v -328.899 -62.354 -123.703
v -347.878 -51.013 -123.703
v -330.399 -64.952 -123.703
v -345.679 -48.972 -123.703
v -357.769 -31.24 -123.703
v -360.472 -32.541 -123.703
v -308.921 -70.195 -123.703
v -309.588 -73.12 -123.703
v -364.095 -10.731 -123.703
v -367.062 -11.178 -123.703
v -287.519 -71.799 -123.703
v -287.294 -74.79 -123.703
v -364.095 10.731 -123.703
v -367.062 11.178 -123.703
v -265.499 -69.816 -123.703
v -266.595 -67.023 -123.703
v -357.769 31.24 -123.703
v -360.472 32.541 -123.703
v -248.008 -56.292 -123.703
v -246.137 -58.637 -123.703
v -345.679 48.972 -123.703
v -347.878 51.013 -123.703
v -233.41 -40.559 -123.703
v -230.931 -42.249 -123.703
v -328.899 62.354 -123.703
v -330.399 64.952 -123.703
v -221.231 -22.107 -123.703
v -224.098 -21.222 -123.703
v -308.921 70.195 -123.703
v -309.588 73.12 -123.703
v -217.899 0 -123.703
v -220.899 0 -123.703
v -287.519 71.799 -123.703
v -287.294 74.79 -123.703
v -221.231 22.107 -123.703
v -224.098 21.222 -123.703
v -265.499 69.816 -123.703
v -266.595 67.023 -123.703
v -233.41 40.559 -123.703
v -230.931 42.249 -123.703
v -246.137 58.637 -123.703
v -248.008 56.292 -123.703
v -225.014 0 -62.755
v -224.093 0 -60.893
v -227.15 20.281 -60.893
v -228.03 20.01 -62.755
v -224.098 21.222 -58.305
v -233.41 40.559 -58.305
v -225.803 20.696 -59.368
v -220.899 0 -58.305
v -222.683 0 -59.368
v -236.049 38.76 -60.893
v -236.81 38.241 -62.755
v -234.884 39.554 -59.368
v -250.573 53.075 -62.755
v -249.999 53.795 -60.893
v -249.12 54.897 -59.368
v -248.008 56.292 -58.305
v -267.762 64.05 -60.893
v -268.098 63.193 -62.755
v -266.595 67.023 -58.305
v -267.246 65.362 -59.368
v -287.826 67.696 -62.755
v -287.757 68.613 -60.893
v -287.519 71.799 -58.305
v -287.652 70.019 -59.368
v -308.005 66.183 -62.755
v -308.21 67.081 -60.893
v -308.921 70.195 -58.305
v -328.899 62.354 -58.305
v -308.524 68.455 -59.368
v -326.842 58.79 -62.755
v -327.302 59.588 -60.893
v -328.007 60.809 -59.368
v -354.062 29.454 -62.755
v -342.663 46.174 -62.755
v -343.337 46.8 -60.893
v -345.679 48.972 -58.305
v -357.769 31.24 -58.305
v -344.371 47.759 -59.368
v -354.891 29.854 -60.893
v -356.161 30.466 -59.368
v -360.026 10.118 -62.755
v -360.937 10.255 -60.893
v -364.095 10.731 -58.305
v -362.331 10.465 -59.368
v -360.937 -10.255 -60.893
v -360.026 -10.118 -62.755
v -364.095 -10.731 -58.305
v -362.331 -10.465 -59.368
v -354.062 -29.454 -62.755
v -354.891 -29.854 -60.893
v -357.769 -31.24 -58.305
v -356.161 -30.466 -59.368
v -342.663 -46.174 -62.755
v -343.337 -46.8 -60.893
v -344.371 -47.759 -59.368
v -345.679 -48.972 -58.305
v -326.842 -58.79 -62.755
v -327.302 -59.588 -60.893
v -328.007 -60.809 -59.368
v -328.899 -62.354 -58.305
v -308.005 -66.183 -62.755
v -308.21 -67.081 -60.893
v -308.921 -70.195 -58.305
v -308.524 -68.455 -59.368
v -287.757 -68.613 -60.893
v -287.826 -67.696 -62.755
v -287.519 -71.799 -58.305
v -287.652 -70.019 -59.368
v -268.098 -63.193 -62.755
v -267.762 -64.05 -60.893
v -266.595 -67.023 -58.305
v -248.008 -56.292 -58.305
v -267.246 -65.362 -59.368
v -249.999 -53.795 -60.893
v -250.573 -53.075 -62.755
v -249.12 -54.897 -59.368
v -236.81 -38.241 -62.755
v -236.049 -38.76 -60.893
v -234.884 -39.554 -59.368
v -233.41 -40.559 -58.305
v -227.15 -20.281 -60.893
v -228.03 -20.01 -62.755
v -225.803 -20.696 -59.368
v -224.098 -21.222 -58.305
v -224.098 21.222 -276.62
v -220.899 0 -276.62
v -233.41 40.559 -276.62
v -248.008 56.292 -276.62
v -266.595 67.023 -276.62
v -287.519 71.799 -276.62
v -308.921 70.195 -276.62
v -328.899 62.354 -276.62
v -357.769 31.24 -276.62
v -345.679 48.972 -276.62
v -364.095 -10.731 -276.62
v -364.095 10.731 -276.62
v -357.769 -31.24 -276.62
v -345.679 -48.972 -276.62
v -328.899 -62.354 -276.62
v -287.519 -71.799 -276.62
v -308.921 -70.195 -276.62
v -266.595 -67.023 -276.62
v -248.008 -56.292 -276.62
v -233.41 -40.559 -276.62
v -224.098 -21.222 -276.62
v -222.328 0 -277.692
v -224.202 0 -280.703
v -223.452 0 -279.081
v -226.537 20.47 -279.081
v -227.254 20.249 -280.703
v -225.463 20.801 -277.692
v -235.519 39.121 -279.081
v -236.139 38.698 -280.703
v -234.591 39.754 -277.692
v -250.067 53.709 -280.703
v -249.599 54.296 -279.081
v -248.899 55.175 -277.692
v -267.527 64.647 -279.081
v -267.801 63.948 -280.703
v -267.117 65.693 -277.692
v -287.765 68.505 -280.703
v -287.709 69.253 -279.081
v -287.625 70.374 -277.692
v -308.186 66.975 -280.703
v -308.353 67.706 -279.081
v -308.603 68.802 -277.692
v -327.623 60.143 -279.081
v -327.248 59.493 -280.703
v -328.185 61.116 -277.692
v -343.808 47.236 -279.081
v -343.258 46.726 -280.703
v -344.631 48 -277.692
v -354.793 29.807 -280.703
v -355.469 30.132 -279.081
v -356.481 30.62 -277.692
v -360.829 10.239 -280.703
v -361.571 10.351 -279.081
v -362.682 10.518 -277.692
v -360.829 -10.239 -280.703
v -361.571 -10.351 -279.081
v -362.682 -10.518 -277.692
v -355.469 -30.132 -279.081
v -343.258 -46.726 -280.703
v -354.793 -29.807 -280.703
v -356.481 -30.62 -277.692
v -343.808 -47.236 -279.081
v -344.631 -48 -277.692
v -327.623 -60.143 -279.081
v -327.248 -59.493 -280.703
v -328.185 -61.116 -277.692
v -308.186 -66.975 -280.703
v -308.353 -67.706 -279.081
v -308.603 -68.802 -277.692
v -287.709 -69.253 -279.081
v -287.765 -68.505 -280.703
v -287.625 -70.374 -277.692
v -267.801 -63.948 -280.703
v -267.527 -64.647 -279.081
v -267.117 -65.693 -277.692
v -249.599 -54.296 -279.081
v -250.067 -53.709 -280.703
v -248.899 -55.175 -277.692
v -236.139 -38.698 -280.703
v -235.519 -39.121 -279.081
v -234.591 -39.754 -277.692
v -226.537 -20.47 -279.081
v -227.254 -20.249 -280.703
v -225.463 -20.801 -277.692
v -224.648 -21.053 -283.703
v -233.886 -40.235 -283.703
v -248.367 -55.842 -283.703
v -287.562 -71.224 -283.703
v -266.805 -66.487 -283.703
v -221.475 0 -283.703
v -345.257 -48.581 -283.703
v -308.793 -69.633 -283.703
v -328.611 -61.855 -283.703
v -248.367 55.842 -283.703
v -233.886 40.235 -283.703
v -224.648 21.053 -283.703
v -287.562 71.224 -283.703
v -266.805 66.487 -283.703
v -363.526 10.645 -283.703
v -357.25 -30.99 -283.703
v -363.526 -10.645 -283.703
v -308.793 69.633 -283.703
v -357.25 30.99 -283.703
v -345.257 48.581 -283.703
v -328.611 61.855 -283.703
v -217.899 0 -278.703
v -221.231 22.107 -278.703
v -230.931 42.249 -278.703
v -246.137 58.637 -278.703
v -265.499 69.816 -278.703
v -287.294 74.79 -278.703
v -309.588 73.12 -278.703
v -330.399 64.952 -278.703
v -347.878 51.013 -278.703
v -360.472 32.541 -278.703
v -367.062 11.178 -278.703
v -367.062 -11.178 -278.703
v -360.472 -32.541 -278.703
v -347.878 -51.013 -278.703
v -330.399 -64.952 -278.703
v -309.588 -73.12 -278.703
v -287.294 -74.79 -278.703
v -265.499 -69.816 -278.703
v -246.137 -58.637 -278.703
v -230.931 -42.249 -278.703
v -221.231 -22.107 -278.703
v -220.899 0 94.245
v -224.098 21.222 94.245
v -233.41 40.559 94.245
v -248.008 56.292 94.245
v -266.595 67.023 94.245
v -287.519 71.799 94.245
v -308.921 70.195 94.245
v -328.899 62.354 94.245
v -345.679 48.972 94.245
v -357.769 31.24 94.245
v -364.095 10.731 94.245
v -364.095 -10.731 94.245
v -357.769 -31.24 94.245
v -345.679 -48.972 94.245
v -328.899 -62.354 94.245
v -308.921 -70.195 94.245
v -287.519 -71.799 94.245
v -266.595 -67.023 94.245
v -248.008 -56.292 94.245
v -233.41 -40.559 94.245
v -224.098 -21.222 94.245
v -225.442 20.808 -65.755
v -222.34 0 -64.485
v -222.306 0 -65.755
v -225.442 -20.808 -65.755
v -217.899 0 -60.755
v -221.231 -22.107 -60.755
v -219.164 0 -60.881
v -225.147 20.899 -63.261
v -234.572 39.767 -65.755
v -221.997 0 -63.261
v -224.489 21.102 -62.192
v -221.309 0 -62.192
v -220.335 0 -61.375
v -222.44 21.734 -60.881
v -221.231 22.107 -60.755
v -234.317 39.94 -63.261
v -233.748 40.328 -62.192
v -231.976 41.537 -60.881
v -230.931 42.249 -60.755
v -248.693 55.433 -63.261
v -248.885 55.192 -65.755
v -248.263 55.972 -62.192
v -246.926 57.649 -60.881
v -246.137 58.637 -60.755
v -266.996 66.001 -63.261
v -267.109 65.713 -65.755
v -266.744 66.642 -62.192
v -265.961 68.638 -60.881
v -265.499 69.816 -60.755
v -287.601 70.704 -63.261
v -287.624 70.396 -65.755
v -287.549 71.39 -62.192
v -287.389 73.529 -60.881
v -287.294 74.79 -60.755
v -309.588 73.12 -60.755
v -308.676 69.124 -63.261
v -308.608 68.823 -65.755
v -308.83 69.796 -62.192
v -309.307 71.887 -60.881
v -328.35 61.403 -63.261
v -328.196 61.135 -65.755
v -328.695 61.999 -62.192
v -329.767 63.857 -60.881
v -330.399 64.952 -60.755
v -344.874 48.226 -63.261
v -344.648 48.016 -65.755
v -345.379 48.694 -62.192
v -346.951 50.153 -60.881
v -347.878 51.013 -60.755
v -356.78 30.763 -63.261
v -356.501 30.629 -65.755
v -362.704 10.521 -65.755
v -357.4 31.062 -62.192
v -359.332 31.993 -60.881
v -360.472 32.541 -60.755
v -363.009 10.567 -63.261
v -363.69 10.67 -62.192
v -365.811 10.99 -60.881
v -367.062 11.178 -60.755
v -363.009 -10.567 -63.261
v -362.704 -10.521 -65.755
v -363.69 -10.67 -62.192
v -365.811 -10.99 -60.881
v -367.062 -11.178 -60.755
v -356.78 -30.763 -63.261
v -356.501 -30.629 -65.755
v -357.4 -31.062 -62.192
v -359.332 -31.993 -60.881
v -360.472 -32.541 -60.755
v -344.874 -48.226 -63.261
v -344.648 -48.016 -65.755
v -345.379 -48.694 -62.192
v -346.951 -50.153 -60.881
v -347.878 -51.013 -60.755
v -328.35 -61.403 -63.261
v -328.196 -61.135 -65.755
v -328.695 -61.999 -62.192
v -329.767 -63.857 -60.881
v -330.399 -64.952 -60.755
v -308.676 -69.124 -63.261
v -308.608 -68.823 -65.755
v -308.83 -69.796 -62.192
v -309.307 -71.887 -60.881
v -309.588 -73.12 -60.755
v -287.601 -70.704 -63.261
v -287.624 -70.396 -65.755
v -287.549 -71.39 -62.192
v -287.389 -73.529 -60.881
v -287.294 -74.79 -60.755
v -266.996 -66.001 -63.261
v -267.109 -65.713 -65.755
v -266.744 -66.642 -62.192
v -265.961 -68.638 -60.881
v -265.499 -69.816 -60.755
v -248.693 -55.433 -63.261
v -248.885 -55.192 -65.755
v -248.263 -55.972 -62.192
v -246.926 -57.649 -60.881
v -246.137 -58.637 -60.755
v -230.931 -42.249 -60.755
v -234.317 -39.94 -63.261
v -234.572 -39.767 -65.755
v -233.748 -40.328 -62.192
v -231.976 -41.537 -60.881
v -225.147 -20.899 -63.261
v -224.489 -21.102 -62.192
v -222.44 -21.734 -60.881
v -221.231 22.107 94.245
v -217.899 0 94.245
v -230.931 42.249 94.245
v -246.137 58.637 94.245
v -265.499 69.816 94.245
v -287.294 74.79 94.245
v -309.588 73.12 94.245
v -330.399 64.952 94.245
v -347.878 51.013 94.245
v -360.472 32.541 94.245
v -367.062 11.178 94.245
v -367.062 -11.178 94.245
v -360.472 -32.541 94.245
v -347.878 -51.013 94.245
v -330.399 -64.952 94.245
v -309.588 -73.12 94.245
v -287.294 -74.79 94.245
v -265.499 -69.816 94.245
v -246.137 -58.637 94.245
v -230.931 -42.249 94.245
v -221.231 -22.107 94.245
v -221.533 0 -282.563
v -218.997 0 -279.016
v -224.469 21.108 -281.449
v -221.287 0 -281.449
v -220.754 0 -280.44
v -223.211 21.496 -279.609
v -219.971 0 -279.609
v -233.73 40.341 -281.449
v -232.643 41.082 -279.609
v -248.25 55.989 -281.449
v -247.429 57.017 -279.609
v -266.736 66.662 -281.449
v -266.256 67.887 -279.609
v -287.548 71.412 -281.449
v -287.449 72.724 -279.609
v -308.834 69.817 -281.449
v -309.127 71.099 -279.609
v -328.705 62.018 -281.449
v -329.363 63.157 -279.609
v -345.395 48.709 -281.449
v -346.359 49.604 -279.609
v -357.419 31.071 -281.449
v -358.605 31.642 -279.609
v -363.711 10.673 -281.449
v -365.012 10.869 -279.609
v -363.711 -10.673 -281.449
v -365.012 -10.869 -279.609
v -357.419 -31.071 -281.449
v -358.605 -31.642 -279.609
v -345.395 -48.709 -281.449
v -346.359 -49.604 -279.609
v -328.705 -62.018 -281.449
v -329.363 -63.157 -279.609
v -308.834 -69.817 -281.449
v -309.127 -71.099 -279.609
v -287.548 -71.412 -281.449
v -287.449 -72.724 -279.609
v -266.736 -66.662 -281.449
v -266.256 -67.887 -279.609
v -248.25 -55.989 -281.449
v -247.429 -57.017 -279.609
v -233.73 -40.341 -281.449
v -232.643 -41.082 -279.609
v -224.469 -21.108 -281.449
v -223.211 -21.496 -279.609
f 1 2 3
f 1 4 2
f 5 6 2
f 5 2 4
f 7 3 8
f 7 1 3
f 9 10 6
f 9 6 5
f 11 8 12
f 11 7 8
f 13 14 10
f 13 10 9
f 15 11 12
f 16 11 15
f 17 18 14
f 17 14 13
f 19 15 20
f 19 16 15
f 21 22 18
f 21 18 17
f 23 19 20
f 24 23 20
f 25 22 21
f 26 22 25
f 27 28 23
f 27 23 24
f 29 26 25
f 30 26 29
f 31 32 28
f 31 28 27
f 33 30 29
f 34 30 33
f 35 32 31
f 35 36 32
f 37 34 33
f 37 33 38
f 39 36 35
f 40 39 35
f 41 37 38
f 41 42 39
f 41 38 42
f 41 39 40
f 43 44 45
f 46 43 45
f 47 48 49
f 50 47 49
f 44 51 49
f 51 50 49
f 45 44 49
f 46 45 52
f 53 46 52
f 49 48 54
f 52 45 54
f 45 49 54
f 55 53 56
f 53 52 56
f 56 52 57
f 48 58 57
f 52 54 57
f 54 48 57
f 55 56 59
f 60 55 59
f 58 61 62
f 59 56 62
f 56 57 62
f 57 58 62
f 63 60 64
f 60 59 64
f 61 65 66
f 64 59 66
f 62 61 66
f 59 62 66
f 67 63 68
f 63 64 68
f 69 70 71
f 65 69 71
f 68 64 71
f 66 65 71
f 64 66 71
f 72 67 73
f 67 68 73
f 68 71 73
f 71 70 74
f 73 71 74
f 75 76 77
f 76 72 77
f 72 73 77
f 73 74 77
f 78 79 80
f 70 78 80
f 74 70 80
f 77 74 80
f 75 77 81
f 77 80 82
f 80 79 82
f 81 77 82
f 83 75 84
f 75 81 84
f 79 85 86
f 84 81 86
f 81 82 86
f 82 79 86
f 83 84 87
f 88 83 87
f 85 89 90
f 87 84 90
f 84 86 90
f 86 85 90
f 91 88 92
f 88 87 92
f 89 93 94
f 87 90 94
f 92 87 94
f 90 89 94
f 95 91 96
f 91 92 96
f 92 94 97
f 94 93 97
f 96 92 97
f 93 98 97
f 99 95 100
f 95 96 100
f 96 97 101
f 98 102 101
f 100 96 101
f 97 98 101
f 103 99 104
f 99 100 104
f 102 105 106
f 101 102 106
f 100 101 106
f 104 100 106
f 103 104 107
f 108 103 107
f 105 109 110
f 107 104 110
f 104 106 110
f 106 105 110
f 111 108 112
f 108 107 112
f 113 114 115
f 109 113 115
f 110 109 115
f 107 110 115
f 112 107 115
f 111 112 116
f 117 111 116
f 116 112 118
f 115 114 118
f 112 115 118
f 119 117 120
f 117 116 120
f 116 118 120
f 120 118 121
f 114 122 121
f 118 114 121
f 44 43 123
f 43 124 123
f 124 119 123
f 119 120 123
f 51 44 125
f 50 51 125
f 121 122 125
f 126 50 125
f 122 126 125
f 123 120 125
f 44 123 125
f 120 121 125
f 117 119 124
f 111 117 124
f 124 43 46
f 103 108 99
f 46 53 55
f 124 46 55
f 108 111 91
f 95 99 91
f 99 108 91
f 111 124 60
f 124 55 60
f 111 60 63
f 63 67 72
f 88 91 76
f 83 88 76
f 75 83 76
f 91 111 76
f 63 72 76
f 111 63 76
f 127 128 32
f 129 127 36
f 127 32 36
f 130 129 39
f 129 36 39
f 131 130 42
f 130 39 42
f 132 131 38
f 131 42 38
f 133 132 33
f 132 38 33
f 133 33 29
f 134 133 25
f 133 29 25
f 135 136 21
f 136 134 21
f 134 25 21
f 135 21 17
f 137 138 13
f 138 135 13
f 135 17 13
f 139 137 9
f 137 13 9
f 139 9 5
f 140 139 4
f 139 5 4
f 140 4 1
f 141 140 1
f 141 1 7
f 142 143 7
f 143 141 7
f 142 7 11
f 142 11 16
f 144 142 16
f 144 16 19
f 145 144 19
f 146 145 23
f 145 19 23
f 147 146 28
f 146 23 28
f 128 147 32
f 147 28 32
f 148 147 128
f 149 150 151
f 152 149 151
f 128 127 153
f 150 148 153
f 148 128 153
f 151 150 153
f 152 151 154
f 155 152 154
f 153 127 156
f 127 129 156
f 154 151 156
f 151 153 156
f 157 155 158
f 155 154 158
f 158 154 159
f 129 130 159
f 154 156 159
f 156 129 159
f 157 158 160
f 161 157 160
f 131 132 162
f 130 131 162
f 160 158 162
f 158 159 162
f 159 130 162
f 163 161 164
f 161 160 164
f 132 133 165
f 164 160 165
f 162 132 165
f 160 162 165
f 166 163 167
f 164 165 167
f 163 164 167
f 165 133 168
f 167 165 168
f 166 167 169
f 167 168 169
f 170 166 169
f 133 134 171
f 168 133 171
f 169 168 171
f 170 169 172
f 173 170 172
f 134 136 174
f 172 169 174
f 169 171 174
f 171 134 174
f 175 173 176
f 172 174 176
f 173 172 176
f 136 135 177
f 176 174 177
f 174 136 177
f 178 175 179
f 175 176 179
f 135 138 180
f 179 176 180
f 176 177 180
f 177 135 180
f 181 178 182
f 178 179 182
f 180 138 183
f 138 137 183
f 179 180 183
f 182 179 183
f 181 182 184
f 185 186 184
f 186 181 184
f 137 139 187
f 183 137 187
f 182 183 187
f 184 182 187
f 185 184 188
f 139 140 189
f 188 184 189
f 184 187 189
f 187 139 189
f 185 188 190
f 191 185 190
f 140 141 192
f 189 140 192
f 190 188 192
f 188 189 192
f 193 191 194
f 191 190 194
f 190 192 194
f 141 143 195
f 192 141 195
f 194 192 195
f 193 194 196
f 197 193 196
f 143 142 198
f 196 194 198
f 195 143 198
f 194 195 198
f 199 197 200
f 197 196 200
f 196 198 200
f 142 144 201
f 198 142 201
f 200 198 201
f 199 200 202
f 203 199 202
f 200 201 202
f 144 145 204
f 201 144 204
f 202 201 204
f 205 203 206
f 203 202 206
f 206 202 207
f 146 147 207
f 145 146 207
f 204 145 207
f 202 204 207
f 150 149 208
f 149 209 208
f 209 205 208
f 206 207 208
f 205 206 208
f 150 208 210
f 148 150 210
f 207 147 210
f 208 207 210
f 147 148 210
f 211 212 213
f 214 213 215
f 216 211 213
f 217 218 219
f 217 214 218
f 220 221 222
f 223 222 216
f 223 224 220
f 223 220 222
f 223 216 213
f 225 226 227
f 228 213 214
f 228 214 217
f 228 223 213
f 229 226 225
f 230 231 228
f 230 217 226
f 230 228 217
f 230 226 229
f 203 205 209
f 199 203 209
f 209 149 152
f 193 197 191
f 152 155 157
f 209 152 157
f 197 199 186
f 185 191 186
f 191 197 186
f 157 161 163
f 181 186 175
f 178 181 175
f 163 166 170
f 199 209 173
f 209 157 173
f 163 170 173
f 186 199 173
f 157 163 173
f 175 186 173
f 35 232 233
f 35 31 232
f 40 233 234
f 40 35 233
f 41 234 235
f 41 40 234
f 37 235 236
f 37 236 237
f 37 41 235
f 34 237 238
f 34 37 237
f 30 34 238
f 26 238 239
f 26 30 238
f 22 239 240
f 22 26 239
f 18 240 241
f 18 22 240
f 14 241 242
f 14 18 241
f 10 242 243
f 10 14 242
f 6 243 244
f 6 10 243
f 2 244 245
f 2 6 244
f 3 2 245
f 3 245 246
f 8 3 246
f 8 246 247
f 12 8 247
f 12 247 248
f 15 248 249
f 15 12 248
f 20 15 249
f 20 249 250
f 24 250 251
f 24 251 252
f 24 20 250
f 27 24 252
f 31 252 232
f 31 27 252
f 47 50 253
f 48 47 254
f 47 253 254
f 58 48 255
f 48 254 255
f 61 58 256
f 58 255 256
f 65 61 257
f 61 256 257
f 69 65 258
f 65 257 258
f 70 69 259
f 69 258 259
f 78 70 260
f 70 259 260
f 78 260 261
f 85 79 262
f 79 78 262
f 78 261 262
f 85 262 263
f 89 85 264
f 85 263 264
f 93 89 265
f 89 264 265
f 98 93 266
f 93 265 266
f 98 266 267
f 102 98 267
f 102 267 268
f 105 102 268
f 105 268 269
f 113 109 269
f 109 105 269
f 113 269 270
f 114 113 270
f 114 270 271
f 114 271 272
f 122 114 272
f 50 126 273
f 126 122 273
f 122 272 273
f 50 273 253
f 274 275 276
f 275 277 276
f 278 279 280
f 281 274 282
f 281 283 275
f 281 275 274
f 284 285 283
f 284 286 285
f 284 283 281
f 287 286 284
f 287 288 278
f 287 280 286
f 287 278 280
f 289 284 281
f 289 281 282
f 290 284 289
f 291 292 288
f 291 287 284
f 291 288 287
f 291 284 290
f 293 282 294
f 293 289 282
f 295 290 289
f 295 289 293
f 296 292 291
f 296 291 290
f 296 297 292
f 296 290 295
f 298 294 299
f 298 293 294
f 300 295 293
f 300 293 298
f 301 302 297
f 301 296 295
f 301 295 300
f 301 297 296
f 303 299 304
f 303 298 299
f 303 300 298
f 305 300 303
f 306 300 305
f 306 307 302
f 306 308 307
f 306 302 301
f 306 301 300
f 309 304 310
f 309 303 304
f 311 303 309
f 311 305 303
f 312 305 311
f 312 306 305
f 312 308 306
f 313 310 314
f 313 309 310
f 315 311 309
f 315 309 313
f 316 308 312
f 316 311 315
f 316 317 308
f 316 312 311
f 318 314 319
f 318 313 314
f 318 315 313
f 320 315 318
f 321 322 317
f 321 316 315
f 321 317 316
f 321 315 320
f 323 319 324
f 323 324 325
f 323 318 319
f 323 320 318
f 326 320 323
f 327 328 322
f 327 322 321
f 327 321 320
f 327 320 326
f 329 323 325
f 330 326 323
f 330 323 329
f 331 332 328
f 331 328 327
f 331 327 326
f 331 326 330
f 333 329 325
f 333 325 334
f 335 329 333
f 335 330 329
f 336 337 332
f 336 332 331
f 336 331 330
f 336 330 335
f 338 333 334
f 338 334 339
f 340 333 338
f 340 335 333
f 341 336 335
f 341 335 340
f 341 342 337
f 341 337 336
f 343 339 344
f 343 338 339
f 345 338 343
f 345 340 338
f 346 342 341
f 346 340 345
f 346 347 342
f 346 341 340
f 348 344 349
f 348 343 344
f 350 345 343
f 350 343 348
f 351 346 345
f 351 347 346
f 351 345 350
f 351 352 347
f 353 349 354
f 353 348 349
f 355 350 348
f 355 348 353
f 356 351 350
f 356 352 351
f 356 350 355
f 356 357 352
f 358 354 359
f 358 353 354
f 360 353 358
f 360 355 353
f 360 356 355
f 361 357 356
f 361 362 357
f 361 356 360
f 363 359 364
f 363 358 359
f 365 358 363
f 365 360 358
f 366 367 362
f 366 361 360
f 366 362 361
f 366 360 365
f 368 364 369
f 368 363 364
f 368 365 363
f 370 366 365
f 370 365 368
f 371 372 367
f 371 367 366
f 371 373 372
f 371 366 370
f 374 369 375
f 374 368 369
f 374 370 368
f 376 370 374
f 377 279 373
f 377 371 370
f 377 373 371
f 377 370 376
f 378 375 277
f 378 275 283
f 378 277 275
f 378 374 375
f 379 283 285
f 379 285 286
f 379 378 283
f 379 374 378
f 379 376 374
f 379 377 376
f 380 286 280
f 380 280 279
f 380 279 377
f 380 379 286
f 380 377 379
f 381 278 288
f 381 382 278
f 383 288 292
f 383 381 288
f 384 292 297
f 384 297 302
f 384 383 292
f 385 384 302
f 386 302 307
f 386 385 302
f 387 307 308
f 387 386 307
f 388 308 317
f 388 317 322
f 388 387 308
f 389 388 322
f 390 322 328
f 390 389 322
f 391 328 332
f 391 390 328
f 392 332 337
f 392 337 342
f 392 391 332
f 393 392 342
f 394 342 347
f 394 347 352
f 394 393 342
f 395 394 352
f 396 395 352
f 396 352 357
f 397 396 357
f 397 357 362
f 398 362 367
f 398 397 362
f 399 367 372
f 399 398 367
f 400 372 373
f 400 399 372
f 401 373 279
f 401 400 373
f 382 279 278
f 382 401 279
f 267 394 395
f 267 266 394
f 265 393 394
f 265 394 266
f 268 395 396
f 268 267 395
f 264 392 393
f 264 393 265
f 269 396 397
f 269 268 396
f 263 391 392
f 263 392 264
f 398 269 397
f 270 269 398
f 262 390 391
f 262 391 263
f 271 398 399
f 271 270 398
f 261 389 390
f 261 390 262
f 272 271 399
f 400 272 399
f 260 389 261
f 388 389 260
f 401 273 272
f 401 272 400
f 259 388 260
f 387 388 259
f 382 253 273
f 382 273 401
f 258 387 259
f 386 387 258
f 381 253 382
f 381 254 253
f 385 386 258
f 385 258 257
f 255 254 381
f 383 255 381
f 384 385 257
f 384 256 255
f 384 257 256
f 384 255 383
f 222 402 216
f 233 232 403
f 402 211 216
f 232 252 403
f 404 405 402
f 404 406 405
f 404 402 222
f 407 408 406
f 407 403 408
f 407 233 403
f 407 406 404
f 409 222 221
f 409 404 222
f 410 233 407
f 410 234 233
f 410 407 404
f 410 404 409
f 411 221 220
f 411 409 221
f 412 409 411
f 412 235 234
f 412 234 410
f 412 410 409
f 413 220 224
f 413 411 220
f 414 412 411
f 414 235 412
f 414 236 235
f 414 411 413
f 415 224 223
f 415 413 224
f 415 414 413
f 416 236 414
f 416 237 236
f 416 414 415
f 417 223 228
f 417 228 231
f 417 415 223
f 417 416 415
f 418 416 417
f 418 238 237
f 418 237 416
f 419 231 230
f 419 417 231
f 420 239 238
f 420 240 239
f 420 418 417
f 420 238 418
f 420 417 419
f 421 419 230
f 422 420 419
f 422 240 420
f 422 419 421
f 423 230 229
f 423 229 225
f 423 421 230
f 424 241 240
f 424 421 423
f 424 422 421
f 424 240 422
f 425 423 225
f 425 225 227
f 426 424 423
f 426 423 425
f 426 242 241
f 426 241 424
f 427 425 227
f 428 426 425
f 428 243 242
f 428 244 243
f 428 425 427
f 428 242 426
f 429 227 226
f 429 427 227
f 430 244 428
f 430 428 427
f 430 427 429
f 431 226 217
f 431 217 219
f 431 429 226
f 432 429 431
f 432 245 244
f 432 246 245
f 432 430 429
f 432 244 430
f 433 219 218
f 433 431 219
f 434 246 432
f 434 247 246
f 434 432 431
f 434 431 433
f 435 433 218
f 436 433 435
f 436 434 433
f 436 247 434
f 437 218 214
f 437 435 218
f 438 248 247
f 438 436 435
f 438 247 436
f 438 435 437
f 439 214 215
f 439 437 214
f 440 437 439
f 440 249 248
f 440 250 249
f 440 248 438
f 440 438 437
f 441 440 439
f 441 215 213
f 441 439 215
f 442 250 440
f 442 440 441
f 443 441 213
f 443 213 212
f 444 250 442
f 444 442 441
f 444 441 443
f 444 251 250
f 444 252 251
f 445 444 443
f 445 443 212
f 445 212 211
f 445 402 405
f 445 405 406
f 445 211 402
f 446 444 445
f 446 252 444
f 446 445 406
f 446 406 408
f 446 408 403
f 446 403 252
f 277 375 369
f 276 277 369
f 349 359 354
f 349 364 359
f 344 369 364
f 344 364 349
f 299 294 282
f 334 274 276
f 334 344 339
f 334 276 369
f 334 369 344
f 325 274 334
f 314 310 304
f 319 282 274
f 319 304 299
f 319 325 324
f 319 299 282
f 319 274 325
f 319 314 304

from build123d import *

# Parameters (mm, degrees)
F2_T = -3
F4_T = -3


with BuildPart() as f1:
    # F0 (on Front) → F1 (revolve)
    with BuildSketch(Plane.XZ):
        with BuildLine():
            Line((-217.8991883993, -60.755127635), (-217.8991883993, 94.244872365))
            Line((-217.8991883993, 94.244872365), (-292.8991883993, 94.244872365))
            Line((-292.8991883993, 94.244872365), (-292.8991883993, -65.755127635))
            Line((-292.8991883993, -65.755127635), (-222.3060273323, -65.755127635))
            ThreePointArc((-222.3060273323, -65.755127635), (-221.3085525164, -62.1922468676), (-217.8991883993, -60.755127635))
        make_face()
    revolve(axis=Axis((-292.8991883993, 0, 14.244872365), (0, 0, 1)))

    # F2
    f2_openings = [f1.faces().sort_by_distance(p)[0] for p in [
        (-292.899188, 0, 94.244872),
    ]]
    offset(amount=F2_T, openings=f2_openings)


with BuildPart() as f3:
    # F0 (on Front) → F3 (revolve)
    with BuildSketch(Plane.XZ):
        with BuildLine():
            Line((-217.8991883993, -278.7027198076), (-217.8991883993, -123.7027198076))
            Line((-217.8991883993, -123.7027198076), (-292.8991883993, -123.7027198076))
            Line((-292.8991883993, -123.7027198076), (-292.8991883993, -283.7027198076))
            Line((-292.8991883993, -283.7027198076), (-221.475007263, -283.7027198076))
            ThreePointArc((-221.475007263, -283.7027198076), (-220.7536117958, -280.439987657), (-217.8991883993, -278.7027198076))
        make_face()
    revolve(axis=Axis((-292.8991883993, 0, -203.7027198076), (0, 0, 1)))

    # F4
    f4_openings = [f3.faces().sort_by_distance(p)[0] for p in [
        (-292.899188, 0, -123.70272),
    ]]
    offset(amount=F4_T, openings=f4_openings)


solid = Compound([f1.part, f3.part])
